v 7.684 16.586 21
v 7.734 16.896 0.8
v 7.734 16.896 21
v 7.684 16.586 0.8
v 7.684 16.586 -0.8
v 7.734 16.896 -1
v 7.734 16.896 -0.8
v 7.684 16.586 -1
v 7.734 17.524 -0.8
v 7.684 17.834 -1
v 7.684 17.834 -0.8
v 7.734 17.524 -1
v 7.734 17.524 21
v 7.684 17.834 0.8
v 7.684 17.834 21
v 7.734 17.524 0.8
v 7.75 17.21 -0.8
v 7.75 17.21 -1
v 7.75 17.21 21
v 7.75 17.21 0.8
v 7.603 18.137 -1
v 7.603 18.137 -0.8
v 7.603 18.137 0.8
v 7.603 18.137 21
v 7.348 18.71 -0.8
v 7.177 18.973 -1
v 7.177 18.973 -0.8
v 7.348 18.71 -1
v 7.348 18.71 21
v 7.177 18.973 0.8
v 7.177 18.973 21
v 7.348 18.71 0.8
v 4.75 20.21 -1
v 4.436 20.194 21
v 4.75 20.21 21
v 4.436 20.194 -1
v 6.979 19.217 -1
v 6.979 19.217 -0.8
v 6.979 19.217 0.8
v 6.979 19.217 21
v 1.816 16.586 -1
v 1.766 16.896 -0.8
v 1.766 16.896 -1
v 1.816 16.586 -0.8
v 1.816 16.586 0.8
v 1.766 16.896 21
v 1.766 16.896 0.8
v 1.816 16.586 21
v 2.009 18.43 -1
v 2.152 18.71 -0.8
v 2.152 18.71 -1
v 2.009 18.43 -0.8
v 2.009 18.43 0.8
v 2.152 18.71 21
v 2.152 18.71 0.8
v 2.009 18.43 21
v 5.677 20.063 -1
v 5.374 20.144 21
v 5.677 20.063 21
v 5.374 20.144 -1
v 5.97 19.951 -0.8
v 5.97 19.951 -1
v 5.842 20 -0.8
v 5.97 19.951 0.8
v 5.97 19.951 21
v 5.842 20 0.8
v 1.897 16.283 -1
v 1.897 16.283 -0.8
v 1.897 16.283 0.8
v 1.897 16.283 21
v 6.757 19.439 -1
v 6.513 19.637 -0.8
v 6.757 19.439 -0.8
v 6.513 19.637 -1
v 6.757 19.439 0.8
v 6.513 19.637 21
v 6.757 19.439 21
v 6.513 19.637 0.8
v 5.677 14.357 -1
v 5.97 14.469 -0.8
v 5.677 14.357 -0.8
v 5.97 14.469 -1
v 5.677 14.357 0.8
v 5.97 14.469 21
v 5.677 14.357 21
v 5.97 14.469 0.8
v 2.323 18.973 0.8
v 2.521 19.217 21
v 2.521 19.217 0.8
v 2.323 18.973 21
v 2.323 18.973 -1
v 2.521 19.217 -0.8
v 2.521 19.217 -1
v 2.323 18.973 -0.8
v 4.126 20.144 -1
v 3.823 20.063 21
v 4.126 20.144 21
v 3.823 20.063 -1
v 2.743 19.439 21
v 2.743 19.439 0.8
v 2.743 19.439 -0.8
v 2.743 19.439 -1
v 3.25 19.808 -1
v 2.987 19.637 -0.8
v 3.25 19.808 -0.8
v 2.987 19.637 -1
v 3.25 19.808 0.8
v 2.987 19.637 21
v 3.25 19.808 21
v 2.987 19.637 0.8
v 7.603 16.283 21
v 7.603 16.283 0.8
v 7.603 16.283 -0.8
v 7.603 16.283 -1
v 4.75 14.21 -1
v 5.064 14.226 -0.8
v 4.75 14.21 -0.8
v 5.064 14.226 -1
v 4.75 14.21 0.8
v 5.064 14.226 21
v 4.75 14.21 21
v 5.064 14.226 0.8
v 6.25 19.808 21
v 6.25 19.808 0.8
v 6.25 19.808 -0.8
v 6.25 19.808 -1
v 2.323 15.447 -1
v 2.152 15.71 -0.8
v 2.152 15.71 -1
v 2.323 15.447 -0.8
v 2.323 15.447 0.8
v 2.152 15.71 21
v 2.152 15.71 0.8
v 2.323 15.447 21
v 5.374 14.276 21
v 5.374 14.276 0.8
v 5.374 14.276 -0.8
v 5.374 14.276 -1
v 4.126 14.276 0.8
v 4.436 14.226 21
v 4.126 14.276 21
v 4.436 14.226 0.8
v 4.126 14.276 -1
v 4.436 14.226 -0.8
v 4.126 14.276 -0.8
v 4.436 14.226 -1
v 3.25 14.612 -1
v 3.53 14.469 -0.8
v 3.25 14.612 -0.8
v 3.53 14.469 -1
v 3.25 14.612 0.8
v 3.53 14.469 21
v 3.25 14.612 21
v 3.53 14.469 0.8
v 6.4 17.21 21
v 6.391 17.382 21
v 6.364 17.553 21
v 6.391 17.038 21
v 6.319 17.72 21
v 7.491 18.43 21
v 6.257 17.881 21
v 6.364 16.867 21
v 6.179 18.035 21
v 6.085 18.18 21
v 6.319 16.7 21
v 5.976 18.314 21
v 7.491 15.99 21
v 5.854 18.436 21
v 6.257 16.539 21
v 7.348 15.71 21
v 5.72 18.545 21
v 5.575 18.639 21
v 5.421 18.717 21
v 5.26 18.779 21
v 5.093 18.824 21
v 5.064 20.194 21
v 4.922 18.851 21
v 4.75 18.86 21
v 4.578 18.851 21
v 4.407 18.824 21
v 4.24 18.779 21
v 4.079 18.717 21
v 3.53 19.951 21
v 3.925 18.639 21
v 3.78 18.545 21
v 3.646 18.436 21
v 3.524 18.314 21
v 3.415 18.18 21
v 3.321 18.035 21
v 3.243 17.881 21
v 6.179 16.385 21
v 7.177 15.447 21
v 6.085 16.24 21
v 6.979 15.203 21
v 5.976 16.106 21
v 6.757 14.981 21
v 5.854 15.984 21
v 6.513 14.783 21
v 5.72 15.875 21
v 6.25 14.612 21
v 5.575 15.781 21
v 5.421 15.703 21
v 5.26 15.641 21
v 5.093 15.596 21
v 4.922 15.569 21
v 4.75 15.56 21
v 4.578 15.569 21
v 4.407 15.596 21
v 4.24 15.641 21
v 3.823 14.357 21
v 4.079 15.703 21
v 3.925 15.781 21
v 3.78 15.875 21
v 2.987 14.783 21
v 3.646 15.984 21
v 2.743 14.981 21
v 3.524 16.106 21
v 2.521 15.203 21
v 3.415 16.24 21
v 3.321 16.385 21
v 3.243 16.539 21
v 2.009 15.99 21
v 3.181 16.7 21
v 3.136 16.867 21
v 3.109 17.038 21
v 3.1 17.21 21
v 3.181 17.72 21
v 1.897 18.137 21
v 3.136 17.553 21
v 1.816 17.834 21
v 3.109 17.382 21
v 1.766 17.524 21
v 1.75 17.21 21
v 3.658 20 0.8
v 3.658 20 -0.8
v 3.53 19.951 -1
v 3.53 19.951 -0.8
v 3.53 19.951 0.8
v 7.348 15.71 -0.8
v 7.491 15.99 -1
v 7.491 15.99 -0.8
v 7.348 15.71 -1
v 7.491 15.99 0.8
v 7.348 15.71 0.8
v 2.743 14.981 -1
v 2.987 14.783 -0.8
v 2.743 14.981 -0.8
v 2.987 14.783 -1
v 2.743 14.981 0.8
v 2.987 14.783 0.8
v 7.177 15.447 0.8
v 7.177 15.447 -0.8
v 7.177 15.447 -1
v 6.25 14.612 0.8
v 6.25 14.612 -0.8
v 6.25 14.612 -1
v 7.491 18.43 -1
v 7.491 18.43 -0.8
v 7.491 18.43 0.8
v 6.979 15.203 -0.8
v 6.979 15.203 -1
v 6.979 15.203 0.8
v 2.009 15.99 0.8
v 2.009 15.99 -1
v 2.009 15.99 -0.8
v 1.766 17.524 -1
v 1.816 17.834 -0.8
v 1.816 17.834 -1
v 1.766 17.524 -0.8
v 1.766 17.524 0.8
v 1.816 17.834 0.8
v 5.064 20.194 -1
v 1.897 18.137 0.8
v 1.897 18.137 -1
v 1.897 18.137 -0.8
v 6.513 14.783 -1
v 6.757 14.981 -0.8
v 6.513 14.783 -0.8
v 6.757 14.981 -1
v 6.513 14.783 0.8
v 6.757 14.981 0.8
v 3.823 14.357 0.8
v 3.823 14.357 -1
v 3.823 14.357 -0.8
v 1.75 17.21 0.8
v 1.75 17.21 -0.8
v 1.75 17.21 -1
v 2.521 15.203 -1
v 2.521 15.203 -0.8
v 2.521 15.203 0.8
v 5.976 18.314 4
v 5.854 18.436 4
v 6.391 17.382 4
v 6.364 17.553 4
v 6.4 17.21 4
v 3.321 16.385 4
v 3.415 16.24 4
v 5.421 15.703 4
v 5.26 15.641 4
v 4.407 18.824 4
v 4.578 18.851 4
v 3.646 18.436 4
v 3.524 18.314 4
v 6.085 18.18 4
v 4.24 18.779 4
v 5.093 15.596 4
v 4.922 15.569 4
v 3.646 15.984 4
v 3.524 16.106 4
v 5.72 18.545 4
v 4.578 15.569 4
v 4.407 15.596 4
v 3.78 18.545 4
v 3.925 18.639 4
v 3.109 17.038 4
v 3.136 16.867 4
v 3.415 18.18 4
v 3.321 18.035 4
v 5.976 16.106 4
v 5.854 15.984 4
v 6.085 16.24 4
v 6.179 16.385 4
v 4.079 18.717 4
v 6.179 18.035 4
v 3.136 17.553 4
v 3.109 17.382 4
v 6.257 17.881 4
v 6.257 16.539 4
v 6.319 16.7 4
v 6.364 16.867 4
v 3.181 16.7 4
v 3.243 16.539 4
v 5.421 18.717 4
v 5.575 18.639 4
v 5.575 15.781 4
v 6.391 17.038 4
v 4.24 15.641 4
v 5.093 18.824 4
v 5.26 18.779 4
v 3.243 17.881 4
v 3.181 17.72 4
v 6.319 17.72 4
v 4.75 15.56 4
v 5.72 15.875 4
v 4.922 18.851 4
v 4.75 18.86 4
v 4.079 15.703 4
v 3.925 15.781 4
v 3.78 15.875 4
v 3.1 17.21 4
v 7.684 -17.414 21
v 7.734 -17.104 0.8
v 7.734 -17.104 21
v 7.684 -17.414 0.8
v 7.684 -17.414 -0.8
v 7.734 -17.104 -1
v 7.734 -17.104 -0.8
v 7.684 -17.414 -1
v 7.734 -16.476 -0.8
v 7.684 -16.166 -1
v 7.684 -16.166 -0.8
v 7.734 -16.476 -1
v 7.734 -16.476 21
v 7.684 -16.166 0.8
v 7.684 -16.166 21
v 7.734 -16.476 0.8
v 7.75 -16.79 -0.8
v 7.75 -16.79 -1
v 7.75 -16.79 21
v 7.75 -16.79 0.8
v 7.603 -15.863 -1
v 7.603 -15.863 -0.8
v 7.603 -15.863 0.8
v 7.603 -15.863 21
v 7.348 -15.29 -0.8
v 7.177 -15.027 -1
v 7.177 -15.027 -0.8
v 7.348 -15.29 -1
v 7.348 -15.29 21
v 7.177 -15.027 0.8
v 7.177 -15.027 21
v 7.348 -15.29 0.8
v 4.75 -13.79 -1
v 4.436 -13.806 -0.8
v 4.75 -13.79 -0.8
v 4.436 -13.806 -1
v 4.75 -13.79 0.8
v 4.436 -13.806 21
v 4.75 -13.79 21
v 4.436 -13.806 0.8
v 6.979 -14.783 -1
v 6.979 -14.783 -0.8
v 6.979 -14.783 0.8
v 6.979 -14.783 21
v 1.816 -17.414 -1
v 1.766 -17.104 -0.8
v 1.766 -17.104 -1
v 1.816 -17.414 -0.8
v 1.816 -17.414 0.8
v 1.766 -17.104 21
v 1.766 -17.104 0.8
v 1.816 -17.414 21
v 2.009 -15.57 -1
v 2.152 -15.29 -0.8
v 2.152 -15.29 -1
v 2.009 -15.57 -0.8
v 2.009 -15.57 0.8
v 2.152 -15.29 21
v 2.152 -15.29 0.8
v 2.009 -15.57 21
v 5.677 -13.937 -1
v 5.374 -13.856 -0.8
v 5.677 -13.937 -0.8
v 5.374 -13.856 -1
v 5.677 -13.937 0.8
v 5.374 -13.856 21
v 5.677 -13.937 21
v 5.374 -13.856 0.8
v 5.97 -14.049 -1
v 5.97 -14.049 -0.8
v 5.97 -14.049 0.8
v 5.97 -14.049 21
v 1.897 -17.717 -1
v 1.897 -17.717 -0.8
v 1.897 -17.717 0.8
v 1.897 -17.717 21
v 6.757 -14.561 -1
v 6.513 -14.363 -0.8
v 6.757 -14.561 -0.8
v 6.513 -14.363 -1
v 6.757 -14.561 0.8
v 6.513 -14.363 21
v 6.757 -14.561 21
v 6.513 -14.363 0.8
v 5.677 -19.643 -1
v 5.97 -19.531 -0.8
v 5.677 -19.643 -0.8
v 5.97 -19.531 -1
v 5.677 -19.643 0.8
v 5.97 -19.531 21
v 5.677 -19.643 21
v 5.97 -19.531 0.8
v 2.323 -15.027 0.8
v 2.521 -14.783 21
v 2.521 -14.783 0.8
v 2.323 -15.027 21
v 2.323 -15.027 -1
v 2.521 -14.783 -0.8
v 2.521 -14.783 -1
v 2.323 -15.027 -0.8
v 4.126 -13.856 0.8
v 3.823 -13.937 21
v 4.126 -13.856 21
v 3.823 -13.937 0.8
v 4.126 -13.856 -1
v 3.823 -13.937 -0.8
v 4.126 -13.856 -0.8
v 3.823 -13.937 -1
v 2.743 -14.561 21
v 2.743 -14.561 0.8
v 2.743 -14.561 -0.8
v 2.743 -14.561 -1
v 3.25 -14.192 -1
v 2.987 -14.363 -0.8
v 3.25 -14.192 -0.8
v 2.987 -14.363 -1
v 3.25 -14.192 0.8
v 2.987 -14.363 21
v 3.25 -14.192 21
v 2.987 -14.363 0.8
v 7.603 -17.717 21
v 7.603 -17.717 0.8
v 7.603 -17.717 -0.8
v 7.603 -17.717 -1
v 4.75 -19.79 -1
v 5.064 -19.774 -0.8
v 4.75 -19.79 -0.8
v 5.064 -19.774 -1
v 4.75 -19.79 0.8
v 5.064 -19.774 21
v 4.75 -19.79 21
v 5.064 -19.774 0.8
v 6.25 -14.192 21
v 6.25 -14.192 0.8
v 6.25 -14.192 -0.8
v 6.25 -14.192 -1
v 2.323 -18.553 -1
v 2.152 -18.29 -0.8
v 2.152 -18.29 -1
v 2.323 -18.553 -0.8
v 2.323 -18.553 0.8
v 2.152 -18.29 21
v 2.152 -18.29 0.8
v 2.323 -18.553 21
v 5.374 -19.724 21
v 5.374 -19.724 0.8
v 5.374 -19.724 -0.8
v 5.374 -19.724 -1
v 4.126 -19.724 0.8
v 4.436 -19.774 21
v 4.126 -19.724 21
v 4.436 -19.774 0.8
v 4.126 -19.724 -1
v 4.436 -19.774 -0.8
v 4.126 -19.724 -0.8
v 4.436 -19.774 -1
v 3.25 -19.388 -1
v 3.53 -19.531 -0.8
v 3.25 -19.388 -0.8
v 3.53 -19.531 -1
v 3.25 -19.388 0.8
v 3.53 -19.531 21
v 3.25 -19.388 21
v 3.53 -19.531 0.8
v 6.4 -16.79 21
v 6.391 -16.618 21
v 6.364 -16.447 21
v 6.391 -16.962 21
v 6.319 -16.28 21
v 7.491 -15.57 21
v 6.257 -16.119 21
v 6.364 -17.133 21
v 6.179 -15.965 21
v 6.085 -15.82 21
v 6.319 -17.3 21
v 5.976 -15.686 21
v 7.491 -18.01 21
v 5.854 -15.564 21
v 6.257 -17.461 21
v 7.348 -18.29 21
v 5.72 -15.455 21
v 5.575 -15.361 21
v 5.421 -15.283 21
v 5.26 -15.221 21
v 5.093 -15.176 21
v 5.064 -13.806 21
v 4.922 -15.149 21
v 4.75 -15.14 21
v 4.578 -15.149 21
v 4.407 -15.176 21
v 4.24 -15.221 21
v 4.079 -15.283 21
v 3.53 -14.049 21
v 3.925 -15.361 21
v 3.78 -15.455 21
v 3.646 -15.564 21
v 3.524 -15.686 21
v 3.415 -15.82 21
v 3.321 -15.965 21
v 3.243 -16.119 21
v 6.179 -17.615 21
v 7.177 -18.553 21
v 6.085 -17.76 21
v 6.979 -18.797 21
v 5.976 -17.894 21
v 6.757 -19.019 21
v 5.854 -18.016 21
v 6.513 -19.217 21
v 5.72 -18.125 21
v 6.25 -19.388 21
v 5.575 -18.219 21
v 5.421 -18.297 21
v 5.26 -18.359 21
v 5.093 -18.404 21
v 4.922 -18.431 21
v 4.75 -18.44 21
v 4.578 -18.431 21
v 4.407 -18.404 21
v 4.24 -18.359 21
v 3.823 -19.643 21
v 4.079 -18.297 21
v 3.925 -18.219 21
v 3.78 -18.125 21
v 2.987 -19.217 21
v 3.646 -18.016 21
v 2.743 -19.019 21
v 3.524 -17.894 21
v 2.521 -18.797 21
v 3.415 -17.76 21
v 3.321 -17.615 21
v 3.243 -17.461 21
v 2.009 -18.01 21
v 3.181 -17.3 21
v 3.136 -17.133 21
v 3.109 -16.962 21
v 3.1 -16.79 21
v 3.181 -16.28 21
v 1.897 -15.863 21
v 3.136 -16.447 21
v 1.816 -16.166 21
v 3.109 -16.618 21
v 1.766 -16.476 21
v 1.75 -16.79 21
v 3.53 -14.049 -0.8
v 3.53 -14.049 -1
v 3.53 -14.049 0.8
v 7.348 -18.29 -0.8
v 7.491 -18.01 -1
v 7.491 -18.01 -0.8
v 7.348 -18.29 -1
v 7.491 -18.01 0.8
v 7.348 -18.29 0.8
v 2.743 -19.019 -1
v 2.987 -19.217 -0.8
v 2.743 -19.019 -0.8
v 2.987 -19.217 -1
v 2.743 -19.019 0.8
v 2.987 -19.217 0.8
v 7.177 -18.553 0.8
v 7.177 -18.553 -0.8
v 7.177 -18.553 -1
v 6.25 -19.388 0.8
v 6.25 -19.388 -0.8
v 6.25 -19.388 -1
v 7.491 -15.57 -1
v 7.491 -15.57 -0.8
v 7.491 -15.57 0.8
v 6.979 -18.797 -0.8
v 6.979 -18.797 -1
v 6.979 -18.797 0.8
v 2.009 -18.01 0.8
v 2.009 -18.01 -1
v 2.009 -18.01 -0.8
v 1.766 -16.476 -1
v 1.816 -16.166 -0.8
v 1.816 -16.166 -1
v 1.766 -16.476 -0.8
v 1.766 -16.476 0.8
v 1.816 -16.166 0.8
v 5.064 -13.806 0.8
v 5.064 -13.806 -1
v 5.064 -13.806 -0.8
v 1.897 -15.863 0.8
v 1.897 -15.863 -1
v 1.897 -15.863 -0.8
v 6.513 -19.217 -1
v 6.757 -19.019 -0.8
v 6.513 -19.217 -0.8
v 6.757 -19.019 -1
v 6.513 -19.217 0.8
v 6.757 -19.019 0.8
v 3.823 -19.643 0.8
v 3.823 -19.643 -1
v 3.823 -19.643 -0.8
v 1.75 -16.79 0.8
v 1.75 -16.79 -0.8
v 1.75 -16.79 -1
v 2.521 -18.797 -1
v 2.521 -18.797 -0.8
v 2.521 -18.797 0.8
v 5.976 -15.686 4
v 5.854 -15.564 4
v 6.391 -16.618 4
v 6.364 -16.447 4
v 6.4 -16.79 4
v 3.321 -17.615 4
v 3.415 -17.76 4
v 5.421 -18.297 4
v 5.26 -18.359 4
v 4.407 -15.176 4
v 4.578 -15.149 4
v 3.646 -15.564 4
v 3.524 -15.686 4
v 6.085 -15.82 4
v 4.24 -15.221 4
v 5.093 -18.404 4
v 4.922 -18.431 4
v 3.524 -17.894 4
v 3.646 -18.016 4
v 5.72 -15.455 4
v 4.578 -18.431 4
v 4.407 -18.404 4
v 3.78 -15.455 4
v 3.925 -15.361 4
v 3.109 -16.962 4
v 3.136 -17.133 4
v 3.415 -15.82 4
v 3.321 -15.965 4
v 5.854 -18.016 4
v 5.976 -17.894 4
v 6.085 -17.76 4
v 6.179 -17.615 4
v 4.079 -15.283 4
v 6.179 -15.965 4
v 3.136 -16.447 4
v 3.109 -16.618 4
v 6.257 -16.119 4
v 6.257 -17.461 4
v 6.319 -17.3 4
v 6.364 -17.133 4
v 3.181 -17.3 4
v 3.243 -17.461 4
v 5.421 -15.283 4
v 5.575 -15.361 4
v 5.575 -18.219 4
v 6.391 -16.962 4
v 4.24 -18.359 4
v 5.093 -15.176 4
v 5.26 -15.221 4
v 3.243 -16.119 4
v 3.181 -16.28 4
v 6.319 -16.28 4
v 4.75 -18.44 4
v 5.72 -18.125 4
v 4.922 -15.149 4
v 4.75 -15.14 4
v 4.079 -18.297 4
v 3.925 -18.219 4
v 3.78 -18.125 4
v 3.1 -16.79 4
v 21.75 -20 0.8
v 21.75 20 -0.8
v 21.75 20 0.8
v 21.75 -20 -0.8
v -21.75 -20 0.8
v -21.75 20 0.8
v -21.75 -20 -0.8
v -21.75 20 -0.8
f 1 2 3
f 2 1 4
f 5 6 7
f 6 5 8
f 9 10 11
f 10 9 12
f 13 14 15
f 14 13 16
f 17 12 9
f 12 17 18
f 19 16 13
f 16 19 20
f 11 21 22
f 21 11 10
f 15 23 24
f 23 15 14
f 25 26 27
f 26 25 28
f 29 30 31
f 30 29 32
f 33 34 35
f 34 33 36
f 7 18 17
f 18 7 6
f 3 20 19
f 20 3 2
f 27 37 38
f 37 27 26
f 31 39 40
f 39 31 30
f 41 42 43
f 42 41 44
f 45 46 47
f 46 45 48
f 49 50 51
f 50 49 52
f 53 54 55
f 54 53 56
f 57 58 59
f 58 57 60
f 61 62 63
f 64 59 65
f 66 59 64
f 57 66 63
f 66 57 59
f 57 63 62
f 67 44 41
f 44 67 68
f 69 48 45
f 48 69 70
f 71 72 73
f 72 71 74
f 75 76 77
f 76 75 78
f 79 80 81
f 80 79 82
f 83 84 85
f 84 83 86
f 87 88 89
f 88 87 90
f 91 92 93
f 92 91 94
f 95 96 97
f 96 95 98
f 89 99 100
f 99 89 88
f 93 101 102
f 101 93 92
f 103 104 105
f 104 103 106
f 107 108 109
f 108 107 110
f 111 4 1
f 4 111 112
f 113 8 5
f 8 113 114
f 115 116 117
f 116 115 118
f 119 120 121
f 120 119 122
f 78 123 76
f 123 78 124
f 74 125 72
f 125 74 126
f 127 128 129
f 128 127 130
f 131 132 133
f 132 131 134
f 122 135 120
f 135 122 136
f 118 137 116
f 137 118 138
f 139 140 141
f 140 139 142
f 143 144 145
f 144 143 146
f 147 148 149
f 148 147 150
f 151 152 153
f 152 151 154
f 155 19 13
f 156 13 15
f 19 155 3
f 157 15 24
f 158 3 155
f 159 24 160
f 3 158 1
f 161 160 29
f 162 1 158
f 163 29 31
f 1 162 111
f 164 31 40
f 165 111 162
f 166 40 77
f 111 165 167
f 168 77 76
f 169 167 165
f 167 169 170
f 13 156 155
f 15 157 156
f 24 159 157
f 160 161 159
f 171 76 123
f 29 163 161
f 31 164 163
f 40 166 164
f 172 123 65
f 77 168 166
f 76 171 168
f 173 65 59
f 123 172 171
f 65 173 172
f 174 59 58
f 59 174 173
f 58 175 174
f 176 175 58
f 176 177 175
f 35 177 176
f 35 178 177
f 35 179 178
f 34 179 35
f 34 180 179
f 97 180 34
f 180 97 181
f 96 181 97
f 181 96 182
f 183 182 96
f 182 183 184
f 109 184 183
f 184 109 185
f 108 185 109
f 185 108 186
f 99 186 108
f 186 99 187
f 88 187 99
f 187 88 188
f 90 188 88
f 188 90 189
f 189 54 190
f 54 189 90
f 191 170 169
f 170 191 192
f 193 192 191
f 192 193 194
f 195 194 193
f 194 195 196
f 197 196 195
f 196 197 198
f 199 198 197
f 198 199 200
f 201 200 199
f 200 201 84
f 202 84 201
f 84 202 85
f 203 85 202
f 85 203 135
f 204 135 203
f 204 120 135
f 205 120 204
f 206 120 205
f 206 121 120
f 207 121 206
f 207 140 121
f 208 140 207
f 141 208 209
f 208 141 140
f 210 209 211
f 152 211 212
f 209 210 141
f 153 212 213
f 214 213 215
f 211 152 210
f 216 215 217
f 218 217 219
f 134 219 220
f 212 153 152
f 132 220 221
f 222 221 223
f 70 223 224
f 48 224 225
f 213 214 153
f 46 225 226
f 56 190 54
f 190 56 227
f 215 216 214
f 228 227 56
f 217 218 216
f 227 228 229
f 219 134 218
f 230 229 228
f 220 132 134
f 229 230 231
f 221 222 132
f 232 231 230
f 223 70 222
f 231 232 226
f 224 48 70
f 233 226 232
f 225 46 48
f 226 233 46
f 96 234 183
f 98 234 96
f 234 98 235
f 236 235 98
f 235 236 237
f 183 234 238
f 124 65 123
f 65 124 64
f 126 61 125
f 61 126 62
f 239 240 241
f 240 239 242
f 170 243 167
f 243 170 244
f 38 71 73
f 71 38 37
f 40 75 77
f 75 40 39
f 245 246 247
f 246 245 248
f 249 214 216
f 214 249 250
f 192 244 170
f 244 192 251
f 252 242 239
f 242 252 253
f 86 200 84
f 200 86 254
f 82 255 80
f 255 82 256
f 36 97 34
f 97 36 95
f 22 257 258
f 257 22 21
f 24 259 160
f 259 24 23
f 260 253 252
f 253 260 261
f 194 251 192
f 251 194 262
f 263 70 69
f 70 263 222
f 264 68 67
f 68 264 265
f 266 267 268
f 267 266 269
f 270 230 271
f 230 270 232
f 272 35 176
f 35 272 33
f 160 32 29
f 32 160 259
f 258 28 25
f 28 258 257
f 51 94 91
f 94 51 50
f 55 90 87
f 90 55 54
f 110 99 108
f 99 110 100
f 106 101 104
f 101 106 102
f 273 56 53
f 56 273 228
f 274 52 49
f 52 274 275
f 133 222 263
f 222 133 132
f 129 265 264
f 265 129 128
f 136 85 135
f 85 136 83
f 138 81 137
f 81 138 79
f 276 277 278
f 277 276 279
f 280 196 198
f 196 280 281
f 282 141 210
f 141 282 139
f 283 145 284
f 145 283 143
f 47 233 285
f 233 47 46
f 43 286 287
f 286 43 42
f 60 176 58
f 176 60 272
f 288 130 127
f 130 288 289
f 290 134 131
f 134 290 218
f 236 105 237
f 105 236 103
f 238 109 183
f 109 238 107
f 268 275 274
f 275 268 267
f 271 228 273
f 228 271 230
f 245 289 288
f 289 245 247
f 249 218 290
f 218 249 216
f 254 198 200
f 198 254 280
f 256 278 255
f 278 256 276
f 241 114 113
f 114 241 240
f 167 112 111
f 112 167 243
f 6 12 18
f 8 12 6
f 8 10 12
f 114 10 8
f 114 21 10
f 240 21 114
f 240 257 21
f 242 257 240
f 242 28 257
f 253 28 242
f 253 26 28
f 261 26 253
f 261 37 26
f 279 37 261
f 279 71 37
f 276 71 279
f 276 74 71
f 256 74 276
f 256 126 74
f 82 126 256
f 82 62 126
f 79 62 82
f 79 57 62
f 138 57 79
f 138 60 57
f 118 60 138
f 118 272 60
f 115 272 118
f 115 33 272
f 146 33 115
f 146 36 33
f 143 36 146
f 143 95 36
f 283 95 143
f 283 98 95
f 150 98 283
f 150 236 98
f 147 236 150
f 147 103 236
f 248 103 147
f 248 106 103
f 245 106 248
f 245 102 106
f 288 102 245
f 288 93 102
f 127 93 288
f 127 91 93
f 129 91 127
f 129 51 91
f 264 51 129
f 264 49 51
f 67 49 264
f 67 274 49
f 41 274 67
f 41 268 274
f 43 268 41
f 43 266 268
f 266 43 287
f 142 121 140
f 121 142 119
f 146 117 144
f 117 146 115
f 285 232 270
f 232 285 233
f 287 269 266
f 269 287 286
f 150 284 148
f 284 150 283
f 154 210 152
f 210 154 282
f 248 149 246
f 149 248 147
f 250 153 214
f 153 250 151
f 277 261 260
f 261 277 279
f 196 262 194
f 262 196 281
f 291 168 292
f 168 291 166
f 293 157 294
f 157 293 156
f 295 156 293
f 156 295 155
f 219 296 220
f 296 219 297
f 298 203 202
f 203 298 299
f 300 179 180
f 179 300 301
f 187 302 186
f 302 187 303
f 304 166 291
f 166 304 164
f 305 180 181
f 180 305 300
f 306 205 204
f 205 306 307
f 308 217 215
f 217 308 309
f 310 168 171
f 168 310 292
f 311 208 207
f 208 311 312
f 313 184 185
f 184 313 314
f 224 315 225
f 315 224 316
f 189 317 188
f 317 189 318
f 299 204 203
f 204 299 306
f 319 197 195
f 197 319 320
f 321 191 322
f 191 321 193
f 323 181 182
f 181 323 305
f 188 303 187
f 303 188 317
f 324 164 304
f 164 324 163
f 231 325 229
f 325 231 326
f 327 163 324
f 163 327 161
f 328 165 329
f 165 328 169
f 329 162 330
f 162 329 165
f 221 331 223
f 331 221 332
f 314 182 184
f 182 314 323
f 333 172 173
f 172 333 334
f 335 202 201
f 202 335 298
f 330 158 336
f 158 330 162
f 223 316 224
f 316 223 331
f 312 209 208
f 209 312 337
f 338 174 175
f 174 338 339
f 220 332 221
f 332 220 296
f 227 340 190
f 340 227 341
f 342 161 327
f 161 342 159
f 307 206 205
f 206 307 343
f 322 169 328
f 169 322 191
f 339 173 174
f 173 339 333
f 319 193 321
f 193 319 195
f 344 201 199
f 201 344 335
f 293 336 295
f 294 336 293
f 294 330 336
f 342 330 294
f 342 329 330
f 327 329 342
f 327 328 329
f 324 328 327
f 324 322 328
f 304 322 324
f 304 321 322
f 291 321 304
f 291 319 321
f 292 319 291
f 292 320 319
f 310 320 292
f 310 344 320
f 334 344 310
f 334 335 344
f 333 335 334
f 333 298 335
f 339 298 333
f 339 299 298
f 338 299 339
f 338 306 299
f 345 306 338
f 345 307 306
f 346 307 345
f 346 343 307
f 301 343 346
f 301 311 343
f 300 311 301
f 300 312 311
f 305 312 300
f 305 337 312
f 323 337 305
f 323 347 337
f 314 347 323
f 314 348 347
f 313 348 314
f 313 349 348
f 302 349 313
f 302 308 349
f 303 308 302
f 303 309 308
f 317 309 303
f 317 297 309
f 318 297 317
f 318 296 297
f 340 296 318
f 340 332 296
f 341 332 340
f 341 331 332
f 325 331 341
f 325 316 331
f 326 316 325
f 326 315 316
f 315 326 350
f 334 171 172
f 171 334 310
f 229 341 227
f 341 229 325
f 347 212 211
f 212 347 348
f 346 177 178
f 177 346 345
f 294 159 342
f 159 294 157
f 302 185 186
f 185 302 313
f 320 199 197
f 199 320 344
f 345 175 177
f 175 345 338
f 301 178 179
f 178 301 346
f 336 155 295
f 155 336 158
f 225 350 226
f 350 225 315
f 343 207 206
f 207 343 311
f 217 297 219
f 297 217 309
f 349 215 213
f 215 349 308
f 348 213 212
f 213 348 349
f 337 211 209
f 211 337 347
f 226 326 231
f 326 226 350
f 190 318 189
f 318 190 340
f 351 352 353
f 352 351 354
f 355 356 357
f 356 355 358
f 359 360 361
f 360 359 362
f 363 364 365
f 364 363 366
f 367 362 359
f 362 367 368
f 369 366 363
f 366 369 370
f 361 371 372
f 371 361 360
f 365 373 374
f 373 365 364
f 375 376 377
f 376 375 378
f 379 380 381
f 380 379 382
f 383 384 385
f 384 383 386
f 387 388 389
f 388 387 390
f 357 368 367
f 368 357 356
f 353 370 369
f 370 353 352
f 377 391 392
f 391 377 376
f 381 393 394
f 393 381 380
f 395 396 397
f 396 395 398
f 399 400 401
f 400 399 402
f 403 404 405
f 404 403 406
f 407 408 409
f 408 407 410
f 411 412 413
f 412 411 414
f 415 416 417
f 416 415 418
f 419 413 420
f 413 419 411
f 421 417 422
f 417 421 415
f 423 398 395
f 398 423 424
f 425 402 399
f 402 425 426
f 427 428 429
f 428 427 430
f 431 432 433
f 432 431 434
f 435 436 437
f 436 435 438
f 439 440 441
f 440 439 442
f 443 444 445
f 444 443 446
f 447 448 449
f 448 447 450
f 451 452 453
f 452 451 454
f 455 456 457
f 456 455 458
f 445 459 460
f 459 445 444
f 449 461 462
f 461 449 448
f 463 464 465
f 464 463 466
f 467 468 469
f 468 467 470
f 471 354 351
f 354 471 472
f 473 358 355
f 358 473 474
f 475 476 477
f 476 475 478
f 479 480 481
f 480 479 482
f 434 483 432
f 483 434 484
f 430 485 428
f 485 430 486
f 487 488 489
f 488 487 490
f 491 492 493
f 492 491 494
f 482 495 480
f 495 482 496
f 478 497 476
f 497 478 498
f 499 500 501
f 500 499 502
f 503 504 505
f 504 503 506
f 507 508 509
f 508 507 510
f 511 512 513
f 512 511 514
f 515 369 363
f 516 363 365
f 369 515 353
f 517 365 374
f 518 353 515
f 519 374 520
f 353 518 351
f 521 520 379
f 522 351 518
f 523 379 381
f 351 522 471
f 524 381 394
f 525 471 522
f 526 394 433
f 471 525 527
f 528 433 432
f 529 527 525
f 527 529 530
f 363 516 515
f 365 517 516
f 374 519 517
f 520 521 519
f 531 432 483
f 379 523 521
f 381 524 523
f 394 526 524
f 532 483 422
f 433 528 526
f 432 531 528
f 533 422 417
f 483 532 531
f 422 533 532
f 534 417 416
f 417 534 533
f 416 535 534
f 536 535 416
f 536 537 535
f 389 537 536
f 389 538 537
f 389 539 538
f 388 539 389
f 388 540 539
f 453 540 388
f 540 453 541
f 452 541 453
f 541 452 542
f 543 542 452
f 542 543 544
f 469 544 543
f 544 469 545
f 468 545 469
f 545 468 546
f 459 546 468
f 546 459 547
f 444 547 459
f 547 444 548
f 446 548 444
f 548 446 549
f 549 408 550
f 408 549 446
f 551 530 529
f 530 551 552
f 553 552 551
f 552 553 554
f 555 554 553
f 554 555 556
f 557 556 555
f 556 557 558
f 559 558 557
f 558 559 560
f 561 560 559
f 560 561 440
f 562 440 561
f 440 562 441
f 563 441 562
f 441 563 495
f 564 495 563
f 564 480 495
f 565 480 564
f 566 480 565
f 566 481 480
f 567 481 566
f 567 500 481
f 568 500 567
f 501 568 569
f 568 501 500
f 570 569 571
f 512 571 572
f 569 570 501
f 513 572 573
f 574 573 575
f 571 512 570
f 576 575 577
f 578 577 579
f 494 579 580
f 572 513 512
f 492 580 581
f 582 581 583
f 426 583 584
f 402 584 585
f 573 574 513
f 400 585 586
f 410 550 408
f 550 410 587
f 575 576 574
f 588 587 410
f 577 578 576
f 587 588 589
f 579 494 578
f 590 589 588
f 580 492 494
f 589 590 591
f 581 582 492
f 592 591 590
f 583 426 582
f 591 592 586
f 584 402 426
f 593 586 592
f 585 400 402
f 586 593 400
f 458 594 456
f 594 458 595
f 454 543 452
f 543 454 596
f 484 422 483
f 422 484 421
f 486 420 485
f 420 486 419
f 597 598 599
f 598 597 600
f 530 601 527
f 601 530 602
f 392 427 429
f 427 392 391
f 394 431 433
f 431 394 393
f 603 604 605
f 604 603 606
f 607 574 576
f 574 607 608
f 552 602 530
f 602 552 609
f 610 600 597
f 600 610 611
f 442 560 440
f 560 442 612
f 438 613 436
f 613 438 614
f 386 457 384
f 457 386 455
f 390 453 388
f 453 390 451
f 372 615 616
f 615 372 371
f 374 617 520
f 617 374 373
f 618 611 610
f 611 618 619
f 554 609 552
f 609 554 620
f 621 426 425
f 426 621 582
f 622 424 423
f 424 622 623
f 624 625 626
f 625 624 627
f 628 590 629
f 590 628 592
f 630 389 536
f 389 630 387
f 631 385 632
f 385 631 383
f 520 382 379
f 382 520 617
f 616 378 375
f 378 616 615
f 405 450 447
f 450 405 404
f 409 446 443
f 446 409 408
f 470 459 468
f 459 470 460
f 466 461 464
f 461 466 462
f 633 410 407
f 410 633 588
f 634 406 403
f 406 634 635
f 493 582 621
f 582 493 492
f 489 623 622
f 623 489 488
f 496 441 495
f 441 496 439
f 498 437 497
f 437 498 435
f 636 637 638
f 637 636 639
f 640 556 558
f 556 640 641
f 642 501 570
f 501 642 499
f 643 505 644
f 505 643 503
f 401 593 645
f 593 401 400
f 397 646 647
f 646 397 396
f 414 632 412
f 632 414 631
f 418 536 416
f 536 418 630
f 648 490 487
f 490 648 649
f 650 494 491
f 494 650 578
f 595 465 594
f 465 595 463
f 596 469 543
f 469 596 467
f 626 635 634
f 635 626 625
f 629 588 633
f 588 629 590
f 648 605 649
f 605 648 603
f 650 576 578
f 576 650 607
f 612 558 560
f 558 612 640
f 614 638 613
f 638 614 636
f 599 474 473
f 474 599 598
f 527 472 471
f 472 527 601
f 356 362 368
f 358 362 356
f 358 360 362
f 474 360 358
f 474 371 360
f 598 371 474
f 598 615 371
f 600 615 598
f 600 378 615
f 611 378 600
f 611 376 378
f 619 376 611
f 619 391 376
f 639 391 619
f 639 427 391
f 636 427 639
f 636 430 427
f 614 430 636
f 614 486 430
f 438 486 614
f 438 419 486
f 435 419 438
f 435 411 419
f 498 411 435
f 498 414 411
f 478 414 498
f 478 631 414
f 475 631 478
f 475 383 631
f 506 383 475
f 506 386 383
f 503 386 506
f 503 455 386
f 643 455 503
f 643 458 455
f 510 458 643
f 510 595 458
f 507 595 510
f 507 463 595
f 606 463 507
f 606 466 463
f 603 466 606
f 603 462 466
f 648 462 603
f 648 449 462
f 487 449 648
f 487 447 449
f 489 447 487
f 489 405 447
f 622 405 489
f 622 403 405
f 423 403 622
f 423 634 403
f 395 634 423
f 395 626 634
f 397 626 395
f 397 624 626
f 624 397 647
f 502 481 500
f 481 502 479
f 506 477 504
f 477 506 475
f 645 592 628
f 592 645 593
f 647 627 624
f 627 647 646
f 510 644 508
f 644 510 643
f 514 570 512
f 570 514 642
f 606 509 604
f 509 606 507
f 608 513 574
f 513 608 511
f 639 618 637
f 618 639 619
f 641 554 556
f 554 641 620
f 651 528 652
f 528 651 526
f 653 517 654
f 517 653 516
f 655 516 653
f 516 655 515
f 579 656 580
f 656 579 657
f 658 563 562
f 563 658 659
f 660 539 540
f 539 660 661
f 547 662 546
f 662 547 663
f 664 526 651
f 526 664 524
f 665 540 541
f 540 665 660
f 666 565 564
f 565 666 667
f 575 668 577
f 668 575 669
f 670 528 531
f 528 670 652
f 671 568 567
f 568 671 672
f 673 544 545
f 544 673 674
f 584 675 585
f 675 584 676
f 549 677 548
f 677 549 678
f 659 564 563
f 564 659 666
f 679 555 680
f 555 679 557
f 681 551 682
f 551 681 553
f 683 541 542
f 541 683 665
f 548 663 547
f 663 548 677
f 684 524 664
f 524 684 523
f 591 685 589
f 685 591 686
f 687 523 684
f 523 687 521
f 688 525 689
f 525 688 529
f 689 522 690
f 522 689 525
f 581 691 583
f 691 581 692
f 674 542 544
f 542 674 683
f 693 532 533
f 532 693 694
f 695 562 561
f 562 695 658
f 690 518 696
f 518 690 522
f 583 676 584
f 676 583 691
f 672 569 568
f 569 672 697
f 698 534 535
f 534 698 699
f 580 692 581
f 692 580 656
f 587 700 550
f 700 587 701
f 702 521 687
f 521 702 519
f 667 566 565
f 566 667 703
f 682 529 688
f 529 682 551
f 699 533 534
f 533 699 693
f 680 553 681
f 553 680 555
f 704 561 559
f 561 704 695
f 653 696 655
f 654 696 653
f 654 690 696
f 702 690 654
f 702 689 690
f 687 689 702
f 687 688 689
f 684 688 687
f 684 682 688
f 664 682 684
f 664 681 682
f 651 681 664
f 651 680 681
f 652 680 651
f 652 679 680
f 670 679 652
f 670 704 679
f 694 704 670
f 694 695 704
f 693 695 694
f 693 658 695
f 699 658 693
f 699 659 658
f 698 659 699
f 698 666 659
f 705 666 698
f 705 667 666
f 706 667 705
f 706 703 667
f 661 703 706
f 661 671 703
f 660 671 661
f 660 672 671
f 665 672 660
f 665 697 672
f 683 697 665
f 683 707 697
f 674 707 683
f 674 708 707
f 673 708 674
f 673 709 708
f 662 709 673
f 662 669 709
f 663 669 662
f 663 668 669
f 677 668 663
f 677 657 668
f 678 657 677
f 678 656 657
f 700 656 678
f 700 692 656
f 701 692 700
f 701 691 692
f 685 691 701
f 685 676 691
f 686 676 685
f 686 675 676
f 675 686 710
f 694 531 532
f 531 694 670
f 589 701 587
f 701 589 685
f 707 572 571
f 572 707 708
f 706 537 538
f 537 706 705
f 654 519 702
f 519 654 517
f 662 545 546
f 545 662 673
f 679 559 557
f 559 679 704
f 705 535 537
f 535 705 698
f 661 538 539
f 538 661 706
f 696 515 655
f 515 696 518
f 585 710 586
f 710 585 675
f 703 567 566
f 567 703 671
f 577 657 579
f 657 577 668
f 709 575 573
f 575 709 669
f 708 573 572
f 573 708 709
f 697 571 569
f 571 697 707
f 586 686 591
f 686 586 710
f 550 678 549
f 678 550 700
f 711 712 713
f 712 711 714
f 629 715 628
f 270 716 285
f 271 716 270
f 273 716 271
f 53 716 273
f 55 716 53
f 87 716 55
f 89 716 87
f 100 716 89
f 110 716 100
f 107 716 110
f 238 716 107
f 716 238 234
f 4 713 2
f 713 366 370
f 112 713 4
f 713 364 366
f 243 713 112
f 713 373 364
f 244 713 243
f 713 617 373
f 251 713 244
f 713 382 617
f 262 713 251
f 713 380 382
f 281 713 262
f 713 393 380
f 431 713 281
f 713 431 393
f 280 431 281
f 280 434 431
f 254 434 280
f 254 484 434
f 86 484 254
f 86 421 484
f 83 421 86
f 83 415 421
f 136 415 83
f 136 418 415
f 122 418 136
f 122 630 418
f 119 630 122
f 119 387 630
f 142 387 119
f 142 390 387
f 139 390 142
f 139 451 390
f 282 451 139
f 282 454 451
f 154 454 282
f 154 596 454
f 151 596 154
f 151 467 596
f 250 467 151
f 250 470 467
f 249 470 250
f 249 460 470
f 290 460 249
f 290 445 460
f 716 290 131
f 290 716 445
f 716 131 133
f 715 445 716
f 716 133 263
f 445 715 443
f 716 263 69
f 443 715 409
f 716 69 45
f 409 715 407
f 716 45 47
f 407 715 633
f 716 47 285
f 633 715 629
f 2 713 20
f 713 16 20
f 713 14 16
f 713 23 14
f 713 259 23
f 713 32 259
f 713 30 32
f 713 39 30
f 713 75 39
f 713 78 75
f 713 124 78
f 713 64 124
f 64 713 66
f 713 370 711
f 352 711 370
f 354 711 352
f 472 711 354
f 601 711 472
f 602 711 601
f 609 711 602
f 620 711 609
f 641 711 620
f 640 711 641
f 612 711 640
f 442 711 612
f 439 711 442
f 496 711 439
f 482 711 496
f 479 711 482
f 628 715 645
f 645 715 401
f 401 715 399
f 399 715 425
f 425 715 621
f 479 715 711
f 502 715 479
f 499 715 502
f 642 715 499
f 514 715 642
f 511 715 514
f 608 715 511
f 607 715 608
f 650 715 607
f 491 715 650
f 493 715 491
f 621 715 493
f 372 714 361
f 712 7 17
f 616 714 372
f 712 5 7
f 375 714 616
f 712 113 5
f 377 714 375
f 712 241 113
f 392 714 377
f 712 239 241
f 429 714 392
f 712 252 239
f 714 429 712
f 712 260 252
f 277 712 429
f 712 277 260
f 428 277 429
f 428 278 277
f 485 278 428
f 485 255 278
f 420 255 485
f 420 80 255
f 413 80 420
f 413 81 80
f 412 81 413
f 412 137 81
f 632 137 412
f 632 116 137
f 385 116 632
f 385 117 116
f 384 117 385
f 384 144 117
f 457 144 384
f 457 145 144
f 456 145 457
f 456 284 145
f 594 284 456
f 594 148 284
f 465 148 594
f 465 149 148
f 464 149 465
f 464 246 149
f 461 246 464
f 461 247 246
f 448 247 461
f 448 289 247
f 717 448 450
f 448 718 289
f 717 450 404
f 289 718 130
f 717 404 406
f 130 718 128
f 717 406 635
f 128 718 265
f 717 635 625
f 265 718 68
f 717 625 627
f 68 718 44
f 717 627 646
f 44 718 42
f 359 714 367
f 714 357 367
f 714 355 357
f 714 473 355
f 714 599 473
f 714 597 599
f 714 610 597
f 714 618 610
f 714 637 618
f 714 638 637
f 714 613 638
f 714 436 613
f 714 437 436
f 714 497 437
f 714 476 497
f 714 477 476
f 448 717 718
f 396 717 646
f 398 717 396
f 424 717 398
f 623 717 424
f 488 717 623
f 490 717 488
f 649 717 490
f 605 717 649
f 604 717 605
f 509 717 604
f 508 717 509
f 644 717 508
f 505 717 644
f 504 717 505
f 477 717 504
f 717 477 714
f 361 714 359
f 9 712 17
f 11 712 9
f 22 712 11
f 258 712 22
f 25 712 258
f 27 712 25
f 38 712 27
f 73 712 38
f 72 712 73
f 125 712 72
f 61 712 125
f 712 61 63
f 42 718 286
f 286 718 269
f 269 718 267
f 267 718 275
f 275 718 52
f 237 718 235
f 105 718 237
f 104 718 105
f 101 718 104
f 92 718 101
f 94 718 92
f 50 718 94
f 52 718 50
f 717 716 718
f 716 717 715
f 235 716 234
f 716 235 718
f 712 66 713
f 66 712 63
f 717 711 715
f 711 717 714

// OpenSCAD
netta_games_pcb(dummy_pins="false");

module netta_games_pcb(dummy_pins="false") {
    pcb_x = 43.5;
    pcb_y = 40.0;
    pcb_h = 1.6;
    pins_h_offset = -1;
    m2_insert_d=3.3;
    
    
    x_shift = pcb_x/2 - 17;
    y_shift = pcb_y/2 - 2.79;
    y_dist = 34;
    
    
    pins_h = 22; // to allow space for the wemos from the box floor
    pins_holder_d = 6;
        
      
    
    
    
    if (dummy_pins=="false") {
        color("green") cube([pcb_x,pcb_y,pcb_h],center=true);
        // the cube that holds the pins, for better layout
        // print the actual pins that will hold the PCB on it
        // wider cylinders to hold the m2 insert
        color("red")    translate([x_shift,y_shift,pins_h_offset])
            m2_holder();
            
        color("yellow") translate([x_shift,y_shift-y_dist,pins_h_offset])
            m2_holder();                   
    } // of if()
    
    if (dummy_pins=="true") {
        color("green") cube([pcb_x,pcb_y,pcb_h],center=true);
    // the cube that holds the pins, for better layout
        // print the pins that will be used to create holes for screws
        color("red")    translate([x_shift,y_shift,pins_h_offset])
            
            cylinder(d=m2_insert_d,h=pins_h,$fn=60);
        color("yellow") translate([x_shift,y_shift-y_dist,pins_h_offset])
            cylinder(d=m2_insert_d,h=pins_h,$fn=60);
        // set box for hole for USB
        rotate([0,0,-90])translate([0,-25,12]) cube([20,40,12],center=true);
        
    } // of if()   
    
    if (dummy_pins=="usb_hole") {
        rotate([0,0,-90])translate([0,-25,8]) cube([20,40,10],center=true);
    } // of if()
    
    
    
    
    module m2_holder() {
        difference(){
            cylinder(d=pins_holder_d,h=pins_h,$fn=60);
            translate([0,0,5]) cylinder(d=m2_insert_d,h=pins_h,$fn=60);
        } // of difference()
        

    } // of m2_holder()
} // of netta_games_pcb()
